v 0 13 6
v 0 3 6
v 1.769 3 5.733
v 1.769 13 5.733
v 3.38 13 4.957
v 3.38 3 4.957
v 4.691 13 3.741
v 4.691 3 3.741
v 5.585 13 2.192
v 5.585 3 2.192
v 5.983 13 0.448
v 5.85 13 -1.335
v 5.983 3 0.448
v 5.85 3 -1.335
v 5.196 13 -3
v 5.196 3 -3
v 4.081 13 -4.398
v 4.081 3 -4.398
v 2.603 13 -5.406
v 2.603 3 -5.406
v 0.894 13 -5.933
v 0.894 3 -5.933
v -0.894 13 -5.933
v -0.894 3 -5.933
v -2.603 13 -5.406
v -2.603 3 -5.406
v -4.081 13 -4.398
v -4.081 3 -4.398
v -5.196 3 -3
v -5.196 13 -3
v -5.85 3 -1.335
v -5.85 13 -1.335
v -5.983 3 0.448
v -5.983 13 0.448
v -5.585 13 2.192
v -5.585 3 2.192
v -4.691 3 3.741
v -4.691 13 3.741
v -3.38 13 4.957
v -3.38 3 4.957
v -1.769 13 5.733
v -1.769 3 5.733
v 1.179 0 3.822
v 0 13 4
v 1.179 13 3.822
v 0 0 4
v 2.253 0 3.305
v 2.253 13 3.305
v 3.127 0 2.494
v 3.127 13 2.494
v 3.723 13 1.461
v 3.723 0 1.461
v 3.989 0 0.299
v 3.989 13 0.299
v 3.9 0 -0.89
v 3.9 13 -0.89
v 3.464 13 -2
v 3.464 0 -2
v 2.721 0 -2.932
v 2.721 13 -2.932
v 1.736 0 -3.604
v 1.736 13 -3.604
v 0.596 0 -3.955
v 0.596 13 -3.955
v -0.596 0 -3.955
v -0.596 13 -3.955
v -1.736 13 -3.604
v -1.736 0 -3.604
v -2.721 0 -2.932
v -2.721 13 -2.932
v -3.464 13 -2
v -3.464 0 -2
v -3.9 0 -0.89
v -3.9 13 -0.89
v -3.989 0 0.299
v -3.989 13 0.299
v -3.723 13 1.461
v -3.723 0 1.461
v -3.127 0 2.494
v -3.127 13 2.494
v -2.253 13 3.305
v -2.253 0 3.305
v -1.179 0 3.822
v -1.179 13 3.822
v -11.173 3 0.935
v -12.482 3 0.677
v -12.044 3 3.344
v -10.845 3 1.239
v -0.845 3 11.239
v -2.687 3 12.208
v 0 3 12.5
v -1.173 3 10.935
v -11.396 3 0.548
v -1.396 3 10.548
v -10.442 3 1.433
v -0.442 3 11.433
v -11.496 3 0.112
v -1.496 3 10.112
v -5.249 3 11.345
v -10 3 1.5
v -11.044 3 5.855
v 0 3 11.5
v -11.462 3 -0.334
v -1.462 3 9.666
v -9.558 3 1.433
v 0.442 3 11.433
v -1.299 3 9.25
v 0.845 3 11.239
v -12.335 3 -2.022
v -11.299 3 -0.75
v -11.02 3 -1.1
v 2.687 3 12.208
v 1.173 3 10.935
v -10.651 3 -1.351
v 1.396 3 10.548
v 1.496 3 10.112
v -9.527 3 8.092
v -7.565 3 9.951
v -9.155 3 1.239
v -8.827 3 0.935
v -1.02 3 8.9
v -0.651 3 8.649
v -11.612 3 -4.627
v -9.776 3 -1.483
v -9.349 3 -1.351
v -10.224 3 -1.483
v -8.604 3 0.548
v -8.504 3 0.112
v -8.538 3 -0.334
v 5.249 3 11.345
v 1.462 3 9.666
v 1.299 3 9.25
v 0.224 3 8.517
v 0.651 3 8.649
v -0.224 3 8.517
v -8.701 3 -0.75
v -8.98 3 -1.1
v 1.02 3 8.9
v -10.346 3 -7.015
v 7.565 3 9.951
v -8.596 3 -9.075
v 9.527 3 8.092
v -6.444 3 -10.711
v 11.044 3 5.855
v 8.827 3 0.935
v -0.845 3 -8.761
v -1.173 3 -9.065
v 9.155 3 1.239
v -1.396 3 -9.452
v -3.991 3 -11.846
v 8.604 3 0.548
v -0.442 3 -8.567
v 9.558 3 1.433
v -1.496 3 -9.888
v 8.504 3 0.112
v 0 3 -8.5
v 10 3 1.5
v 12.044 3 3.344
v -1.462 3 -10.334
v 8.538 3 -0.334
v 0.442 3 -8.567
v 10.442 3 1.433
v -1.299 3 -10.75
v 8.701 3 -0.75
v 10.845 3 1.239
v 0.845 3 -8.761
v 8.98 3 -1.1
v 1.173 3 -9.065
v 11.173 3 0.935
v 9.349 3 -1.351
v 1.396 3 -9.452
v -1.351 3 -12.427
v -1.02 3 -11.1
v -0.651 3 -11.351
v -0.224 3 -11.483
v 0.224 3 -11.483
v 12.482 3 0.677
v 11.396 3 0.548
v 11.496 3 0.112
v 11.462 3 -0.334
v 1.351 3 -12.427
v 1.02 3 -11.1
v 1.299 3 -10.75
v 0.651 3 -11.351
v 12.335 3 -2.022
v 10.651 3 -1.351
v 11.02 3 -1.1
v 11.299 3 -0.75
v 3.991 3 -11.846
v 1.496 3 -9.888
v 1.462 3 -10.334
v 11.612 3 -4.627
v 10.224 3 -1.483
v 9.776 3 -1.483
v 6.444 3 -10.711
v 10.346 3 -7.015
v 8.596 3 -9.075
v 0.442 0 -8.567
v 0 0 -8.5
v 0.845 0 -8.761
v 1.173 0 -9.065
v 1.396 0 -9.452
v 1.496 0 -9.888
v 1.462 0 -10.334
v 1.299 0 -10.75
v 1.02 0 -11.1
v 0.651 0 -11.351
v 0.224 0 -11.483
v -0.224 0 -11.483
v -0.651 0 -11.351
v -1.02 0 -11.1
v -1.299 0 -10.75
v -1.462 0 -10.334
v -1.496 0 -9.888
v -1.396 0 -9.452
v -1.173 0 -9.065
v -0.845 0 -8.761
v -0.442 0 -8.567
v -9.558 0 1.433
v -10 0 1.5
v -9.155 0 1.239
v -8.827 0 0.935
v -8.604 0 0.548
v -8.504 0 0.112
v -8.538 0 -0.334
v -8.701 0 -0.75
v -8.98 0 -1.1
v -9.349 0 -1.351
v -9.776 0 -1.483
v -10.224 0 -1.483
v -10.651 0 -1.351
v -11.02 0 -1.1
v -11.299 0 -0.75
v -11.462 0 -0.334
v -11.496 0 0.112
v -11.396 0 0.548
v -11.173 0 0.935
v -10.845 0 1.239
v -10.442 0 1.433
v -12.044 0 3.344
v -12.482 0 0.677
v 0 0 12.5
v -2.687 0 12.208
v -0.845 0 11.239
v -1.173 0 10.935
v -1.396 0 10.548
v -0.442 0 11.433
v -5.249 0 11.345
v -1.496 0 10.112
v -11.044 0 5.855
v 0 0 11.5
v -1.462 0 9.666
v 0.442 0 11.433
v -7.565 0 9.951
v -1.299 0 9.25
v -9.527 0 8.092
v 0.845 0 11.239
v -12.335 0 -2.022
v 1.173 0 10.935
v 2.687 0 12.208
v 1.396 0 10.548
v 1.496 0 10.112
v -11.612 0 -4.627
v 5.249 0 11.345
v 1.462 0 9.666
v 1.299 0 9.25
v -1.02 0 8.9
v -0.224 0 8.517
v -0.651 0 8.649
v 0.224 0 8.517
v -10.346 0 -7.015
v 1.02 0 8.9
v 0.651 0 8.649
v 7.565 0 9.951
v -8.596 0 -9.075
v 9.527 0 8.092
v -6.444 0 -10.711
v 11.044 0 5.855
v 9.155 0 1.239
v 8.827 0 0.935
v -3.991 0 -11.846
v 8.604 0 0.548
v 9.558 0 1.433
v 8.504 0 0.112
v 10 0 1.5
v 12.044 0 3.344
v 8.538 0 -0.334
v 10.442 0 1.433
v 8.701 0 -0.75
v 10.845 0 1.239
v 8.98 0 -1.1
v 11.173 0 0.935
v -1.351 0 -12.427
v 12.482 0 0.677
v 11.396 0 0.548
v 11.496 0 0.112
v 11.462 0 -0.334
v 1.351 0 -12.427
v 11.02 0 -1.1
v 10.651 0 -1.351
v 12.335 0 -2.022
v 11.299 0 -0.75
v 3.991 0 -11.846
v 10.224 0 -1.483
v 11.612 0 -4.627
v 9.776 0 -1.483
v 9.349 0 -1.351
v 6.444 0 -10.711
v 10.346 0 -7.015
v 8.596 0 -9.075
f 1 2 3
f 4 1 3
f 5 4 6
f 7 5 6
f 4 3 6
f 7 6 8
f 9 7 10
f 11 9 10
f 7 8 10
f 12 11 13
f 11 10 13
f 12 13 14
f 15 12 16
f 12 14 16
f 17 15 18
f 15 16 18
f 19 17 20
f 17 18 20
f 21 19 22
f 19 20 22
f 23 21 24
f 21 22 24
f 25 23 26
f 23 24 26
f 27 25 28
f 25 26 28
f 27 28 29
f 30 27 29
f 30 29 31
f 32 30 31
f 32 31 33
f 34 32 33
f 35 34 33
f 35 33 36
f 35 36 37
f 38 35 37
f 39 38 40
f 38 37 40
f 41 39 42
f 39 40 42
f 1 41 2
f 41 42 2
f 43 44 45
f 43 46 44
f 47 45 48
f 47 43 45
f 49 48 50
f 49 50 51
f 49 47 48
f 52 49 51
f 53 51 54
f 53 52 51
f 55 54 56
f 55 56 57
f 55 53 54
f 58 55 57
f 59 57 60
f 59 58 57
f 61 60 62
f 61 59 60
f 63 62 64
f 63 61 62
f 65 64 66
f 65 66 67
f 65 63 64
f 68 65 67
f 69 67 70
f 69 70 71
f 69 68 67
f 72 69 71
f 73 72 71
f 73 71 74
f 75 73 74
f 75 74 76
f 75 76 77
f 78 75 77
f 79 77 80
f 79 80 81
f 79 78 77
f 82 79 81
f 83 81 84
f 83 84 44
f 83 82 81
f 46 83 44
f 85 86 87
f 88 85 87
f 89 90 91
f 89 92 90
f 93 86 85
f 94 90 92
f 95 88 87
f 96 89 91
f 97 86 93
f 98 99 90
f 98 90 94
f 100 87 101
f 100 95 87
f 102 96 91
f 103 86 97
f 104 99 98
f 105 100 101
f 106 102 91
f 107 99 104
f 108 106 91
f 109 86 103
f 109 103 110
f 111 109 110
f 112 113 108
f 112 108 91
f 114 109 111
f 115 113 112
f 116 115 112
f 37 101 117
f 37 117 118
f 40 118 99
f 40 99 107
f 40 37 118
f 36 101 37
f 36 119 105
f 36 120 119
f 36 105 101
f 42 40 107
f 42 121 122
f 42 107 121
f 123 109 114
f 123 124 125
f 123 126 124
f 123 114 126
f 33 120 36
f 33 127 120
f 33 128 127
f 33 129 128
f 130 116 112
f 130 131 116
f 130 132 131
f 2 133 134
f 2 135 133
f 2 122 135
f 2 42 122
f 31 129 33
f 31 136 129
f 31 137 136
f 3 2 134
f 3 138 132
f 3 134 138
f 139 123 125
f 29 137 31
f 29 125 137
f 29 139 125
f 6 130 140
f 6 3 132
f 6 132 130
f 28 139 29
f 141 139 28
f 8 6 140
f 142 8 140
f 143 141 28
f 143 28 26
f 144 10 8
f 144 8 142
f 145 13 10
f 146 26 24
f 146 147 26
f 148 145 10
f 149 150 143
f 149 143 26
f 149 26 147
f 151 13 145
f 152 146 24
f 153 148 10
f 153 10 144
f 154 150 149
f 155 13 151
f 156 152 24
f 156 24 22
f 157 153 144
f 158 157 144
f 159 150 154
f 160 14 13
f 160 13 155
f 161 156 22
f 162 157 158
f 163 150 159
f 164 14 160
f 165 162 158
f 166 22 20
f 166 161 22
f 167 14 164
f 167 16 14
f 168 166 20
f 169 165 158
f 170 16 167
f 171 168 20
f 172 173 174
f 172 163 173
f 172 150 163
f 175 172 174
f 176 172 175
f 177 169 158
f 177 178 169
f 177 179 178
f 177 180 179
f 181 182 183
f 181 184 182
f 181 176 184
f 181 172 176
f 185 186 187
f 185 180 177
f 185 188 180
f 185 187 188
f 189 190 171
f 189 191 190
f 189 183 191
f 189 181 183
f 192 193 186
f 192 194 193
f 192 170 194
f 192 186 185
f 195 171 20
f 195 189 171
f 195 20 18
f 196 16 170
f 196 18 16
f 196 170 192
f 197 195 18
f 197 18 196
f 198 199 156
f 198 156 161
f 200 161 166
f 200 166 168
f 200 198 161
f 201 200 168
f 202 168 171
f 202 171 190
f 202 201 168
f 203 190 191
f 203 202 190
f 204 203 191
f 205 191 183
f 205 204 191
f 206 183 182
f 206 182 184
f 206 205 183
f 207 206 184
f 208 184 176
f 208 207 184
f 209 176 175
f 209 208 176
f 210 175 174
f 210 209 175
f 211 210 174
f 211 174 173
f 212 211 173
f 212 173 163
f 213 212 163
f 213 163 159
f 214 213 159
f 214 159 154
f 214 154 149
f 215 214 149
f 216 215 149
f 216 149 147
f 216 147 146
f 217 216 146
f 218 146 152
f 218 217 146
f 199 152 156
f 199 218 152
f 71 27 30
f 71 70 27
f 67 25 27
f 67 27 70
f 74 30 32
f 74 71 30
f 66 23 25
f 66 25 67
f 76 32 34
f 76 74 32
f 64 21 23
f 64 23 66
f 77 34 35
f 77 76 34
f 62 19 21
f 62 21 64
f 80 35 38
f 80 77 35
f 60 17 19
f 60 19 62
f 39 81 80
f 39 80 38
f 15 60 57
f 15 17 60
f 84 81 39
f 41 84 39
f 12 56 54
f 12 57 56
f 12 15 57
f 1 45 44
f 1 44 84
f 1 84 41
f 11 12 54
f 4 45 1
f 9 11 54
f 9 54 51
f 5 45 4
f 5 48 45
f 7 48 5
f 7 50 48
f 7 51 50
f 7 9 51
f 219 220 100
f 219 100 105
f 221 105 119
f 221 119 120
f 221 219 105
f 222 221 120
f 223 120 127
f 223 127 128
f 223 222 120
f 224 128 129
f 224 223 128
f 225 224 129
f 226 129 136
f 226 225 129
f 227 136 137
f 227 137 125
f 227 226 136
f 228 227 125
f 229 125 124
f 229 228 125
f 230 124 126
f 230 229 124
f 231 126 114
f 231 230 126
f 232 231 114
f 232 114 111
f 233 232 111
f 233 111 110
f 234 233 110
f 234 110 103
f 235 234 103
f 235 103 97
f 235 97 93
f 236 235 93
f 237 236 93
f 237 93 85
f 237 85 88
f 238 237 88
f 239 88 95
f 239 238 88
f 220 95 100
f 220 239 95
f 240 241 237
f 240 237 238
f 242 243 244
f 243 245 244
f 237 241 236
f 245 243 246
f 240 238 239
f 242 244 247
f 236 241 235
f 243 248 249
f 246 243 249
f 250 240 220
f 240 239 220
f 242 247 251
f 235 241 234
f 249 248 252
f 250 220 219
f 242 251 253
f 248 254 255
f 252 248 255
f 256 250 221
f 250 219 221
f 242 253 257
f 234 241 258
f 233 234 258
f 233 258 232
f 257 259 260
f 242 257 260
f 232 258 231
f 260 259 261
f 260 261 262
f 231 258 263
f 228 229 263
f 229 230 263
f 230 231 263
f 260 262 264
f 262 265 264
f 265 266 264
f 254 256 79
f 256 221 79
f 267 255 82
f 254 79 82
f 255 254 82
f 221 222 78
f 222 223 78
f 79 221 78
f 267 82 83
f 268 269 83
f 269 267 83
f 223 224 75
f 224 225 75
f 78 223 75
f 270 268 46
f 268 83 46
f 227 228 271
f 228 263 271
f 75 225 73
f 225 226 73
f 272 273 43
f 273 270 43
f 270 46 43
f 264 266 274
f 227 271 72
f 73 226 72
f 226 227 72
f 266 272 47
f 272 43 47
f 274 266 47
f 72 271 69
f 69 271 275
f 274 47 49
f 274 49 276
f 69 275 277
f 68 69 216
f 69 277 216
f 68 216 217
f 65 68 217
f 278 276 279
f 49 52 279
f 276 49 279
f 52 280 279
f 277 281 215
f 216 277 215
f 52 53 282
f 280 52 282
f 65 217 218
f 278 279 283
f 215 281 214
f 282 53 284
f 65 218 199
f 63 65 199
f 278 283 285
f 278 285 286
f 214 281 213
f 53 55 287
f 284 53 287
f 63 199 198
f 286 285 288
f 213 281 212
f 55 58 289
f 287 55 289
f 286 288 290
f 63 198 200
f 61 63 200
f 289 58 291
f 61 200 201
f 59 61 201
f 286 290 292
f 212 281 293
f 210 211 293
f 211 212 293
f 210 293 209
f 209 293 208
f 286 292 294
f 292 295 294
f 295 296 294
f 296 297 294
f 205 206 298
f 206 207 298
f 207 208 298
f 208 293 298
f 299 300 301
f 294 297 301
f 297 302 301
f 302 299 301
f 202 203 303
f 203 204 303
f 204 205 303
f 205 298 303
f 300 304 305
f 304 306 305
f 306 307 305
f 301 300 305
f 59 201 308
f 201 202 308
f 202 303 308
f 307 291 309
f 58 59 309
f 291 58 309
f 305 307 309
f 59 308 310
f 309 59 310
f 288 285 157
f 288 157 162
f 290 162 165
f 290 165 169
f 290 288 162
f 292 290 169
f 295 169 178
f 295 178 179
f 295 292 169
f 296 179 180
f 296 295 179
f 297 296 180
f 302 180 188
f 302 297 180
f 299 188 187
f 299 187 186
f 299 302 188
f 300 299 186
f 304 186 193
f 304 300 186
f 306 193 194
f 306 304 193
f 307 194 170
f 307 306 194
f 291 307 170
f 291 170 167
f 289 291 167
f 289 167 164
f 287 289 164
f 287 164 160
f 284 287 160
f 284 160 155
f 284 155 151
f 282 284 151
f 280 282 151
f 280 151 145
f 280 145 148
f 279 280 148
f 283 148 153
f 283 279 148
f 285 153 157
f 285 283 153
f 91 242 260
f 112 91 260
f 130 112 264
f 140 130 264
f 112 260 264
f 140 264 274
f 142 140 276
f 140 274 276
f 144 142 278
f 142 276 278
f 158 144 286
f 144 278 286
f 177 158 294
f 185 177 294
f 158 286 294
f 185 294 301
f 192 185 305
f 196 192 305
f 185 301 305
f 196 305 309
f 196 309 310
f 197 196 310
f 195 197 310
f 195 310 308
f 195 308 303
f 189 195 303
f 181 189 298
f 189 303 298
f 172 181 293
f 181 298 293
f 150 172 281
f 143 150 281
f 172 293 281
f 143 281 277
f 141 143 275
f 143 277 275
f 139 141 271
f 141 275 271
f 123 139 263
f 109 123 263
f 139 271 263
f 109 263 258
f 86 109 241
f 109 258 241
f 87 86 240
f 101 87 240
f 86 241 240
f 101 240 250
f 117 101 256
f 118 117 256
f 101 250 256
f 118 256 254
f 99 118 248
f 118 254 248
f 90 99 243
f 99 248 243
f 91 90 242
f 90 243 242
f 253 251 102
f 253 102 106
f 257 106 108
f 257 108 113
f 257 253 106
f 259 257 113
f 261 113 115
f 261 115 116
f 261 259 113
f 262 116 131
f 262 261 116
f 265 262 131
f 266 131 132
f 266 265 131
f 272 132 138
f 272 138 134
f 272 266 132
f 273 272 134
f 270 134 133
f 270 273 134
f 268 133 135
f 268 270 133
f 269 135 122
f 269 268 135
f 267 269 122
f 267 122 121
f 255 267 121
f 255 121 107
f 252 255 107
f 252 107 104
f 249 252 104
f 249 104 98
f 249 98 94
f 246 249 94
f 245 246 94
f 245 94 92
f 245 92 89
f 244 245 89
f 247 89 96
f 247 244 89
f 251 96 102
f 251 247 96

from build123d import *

# Parameters (mm, degrees)
SKETCH1_R           = 12.5
SKETCH1_R_2         = 1.5
SKETCH1_R_3         = 4
BOSS_EXTRUDE1_DEPTH = 3
BOSS_EXTRUDE2_START = 3
SKETCH1_3_R         = 6
SKETCH1_3_R_2       = 4
BOSS_EXTRUDE2_DEPTH = 10


with BuildPart() as part:
    # Sketch1 → Boss-Extrude1 (new body)
    with BuildSketch(Plane(origin=(0, 0, 0), x_dir=(1, 0, 0), z_dir=(0, 1, 0))):
        Circle(SKETCH1_R)
        with Locations((-10, 0)):
            Circle(SKETCH1_R_2, mode=Mode.SUBTRACT)
        with Locations((0, -10)):
            Circle(SKETCH1_R_2, mode=Mode.SUBTRACT)
        with Locations((10, 0)):
            Circle(SKETCH1_R_2, mode=Mode.SUBTRACT)
        with Locations((0, 10)):
            Circle(SKETCH1_R_2, mode=Mode.SUBTRACT)
        Circle(SKETCH1_R_3, mode=Mode.SUBTRACT)
    extrude(amount=BOSS_EXTRUDE1_DEPTH)

    # Sketch1<3> → Boss-Extrude2 (add)
    with BuildSketch(Plane(origin=(0, 0, 0), x_dir=(1, 0, 0), z_dir=(0, 1, 0)).offset(BOSS_EXTRUDE2_START)):
        Circle(SKETCH1_3_R)
        Circle(SKETCH1_3_R_2, mode=Mode.SUBTRACT)
    extrude(amount=BOSS_EXTRUDE2_DEPTH)


solid = part.part
